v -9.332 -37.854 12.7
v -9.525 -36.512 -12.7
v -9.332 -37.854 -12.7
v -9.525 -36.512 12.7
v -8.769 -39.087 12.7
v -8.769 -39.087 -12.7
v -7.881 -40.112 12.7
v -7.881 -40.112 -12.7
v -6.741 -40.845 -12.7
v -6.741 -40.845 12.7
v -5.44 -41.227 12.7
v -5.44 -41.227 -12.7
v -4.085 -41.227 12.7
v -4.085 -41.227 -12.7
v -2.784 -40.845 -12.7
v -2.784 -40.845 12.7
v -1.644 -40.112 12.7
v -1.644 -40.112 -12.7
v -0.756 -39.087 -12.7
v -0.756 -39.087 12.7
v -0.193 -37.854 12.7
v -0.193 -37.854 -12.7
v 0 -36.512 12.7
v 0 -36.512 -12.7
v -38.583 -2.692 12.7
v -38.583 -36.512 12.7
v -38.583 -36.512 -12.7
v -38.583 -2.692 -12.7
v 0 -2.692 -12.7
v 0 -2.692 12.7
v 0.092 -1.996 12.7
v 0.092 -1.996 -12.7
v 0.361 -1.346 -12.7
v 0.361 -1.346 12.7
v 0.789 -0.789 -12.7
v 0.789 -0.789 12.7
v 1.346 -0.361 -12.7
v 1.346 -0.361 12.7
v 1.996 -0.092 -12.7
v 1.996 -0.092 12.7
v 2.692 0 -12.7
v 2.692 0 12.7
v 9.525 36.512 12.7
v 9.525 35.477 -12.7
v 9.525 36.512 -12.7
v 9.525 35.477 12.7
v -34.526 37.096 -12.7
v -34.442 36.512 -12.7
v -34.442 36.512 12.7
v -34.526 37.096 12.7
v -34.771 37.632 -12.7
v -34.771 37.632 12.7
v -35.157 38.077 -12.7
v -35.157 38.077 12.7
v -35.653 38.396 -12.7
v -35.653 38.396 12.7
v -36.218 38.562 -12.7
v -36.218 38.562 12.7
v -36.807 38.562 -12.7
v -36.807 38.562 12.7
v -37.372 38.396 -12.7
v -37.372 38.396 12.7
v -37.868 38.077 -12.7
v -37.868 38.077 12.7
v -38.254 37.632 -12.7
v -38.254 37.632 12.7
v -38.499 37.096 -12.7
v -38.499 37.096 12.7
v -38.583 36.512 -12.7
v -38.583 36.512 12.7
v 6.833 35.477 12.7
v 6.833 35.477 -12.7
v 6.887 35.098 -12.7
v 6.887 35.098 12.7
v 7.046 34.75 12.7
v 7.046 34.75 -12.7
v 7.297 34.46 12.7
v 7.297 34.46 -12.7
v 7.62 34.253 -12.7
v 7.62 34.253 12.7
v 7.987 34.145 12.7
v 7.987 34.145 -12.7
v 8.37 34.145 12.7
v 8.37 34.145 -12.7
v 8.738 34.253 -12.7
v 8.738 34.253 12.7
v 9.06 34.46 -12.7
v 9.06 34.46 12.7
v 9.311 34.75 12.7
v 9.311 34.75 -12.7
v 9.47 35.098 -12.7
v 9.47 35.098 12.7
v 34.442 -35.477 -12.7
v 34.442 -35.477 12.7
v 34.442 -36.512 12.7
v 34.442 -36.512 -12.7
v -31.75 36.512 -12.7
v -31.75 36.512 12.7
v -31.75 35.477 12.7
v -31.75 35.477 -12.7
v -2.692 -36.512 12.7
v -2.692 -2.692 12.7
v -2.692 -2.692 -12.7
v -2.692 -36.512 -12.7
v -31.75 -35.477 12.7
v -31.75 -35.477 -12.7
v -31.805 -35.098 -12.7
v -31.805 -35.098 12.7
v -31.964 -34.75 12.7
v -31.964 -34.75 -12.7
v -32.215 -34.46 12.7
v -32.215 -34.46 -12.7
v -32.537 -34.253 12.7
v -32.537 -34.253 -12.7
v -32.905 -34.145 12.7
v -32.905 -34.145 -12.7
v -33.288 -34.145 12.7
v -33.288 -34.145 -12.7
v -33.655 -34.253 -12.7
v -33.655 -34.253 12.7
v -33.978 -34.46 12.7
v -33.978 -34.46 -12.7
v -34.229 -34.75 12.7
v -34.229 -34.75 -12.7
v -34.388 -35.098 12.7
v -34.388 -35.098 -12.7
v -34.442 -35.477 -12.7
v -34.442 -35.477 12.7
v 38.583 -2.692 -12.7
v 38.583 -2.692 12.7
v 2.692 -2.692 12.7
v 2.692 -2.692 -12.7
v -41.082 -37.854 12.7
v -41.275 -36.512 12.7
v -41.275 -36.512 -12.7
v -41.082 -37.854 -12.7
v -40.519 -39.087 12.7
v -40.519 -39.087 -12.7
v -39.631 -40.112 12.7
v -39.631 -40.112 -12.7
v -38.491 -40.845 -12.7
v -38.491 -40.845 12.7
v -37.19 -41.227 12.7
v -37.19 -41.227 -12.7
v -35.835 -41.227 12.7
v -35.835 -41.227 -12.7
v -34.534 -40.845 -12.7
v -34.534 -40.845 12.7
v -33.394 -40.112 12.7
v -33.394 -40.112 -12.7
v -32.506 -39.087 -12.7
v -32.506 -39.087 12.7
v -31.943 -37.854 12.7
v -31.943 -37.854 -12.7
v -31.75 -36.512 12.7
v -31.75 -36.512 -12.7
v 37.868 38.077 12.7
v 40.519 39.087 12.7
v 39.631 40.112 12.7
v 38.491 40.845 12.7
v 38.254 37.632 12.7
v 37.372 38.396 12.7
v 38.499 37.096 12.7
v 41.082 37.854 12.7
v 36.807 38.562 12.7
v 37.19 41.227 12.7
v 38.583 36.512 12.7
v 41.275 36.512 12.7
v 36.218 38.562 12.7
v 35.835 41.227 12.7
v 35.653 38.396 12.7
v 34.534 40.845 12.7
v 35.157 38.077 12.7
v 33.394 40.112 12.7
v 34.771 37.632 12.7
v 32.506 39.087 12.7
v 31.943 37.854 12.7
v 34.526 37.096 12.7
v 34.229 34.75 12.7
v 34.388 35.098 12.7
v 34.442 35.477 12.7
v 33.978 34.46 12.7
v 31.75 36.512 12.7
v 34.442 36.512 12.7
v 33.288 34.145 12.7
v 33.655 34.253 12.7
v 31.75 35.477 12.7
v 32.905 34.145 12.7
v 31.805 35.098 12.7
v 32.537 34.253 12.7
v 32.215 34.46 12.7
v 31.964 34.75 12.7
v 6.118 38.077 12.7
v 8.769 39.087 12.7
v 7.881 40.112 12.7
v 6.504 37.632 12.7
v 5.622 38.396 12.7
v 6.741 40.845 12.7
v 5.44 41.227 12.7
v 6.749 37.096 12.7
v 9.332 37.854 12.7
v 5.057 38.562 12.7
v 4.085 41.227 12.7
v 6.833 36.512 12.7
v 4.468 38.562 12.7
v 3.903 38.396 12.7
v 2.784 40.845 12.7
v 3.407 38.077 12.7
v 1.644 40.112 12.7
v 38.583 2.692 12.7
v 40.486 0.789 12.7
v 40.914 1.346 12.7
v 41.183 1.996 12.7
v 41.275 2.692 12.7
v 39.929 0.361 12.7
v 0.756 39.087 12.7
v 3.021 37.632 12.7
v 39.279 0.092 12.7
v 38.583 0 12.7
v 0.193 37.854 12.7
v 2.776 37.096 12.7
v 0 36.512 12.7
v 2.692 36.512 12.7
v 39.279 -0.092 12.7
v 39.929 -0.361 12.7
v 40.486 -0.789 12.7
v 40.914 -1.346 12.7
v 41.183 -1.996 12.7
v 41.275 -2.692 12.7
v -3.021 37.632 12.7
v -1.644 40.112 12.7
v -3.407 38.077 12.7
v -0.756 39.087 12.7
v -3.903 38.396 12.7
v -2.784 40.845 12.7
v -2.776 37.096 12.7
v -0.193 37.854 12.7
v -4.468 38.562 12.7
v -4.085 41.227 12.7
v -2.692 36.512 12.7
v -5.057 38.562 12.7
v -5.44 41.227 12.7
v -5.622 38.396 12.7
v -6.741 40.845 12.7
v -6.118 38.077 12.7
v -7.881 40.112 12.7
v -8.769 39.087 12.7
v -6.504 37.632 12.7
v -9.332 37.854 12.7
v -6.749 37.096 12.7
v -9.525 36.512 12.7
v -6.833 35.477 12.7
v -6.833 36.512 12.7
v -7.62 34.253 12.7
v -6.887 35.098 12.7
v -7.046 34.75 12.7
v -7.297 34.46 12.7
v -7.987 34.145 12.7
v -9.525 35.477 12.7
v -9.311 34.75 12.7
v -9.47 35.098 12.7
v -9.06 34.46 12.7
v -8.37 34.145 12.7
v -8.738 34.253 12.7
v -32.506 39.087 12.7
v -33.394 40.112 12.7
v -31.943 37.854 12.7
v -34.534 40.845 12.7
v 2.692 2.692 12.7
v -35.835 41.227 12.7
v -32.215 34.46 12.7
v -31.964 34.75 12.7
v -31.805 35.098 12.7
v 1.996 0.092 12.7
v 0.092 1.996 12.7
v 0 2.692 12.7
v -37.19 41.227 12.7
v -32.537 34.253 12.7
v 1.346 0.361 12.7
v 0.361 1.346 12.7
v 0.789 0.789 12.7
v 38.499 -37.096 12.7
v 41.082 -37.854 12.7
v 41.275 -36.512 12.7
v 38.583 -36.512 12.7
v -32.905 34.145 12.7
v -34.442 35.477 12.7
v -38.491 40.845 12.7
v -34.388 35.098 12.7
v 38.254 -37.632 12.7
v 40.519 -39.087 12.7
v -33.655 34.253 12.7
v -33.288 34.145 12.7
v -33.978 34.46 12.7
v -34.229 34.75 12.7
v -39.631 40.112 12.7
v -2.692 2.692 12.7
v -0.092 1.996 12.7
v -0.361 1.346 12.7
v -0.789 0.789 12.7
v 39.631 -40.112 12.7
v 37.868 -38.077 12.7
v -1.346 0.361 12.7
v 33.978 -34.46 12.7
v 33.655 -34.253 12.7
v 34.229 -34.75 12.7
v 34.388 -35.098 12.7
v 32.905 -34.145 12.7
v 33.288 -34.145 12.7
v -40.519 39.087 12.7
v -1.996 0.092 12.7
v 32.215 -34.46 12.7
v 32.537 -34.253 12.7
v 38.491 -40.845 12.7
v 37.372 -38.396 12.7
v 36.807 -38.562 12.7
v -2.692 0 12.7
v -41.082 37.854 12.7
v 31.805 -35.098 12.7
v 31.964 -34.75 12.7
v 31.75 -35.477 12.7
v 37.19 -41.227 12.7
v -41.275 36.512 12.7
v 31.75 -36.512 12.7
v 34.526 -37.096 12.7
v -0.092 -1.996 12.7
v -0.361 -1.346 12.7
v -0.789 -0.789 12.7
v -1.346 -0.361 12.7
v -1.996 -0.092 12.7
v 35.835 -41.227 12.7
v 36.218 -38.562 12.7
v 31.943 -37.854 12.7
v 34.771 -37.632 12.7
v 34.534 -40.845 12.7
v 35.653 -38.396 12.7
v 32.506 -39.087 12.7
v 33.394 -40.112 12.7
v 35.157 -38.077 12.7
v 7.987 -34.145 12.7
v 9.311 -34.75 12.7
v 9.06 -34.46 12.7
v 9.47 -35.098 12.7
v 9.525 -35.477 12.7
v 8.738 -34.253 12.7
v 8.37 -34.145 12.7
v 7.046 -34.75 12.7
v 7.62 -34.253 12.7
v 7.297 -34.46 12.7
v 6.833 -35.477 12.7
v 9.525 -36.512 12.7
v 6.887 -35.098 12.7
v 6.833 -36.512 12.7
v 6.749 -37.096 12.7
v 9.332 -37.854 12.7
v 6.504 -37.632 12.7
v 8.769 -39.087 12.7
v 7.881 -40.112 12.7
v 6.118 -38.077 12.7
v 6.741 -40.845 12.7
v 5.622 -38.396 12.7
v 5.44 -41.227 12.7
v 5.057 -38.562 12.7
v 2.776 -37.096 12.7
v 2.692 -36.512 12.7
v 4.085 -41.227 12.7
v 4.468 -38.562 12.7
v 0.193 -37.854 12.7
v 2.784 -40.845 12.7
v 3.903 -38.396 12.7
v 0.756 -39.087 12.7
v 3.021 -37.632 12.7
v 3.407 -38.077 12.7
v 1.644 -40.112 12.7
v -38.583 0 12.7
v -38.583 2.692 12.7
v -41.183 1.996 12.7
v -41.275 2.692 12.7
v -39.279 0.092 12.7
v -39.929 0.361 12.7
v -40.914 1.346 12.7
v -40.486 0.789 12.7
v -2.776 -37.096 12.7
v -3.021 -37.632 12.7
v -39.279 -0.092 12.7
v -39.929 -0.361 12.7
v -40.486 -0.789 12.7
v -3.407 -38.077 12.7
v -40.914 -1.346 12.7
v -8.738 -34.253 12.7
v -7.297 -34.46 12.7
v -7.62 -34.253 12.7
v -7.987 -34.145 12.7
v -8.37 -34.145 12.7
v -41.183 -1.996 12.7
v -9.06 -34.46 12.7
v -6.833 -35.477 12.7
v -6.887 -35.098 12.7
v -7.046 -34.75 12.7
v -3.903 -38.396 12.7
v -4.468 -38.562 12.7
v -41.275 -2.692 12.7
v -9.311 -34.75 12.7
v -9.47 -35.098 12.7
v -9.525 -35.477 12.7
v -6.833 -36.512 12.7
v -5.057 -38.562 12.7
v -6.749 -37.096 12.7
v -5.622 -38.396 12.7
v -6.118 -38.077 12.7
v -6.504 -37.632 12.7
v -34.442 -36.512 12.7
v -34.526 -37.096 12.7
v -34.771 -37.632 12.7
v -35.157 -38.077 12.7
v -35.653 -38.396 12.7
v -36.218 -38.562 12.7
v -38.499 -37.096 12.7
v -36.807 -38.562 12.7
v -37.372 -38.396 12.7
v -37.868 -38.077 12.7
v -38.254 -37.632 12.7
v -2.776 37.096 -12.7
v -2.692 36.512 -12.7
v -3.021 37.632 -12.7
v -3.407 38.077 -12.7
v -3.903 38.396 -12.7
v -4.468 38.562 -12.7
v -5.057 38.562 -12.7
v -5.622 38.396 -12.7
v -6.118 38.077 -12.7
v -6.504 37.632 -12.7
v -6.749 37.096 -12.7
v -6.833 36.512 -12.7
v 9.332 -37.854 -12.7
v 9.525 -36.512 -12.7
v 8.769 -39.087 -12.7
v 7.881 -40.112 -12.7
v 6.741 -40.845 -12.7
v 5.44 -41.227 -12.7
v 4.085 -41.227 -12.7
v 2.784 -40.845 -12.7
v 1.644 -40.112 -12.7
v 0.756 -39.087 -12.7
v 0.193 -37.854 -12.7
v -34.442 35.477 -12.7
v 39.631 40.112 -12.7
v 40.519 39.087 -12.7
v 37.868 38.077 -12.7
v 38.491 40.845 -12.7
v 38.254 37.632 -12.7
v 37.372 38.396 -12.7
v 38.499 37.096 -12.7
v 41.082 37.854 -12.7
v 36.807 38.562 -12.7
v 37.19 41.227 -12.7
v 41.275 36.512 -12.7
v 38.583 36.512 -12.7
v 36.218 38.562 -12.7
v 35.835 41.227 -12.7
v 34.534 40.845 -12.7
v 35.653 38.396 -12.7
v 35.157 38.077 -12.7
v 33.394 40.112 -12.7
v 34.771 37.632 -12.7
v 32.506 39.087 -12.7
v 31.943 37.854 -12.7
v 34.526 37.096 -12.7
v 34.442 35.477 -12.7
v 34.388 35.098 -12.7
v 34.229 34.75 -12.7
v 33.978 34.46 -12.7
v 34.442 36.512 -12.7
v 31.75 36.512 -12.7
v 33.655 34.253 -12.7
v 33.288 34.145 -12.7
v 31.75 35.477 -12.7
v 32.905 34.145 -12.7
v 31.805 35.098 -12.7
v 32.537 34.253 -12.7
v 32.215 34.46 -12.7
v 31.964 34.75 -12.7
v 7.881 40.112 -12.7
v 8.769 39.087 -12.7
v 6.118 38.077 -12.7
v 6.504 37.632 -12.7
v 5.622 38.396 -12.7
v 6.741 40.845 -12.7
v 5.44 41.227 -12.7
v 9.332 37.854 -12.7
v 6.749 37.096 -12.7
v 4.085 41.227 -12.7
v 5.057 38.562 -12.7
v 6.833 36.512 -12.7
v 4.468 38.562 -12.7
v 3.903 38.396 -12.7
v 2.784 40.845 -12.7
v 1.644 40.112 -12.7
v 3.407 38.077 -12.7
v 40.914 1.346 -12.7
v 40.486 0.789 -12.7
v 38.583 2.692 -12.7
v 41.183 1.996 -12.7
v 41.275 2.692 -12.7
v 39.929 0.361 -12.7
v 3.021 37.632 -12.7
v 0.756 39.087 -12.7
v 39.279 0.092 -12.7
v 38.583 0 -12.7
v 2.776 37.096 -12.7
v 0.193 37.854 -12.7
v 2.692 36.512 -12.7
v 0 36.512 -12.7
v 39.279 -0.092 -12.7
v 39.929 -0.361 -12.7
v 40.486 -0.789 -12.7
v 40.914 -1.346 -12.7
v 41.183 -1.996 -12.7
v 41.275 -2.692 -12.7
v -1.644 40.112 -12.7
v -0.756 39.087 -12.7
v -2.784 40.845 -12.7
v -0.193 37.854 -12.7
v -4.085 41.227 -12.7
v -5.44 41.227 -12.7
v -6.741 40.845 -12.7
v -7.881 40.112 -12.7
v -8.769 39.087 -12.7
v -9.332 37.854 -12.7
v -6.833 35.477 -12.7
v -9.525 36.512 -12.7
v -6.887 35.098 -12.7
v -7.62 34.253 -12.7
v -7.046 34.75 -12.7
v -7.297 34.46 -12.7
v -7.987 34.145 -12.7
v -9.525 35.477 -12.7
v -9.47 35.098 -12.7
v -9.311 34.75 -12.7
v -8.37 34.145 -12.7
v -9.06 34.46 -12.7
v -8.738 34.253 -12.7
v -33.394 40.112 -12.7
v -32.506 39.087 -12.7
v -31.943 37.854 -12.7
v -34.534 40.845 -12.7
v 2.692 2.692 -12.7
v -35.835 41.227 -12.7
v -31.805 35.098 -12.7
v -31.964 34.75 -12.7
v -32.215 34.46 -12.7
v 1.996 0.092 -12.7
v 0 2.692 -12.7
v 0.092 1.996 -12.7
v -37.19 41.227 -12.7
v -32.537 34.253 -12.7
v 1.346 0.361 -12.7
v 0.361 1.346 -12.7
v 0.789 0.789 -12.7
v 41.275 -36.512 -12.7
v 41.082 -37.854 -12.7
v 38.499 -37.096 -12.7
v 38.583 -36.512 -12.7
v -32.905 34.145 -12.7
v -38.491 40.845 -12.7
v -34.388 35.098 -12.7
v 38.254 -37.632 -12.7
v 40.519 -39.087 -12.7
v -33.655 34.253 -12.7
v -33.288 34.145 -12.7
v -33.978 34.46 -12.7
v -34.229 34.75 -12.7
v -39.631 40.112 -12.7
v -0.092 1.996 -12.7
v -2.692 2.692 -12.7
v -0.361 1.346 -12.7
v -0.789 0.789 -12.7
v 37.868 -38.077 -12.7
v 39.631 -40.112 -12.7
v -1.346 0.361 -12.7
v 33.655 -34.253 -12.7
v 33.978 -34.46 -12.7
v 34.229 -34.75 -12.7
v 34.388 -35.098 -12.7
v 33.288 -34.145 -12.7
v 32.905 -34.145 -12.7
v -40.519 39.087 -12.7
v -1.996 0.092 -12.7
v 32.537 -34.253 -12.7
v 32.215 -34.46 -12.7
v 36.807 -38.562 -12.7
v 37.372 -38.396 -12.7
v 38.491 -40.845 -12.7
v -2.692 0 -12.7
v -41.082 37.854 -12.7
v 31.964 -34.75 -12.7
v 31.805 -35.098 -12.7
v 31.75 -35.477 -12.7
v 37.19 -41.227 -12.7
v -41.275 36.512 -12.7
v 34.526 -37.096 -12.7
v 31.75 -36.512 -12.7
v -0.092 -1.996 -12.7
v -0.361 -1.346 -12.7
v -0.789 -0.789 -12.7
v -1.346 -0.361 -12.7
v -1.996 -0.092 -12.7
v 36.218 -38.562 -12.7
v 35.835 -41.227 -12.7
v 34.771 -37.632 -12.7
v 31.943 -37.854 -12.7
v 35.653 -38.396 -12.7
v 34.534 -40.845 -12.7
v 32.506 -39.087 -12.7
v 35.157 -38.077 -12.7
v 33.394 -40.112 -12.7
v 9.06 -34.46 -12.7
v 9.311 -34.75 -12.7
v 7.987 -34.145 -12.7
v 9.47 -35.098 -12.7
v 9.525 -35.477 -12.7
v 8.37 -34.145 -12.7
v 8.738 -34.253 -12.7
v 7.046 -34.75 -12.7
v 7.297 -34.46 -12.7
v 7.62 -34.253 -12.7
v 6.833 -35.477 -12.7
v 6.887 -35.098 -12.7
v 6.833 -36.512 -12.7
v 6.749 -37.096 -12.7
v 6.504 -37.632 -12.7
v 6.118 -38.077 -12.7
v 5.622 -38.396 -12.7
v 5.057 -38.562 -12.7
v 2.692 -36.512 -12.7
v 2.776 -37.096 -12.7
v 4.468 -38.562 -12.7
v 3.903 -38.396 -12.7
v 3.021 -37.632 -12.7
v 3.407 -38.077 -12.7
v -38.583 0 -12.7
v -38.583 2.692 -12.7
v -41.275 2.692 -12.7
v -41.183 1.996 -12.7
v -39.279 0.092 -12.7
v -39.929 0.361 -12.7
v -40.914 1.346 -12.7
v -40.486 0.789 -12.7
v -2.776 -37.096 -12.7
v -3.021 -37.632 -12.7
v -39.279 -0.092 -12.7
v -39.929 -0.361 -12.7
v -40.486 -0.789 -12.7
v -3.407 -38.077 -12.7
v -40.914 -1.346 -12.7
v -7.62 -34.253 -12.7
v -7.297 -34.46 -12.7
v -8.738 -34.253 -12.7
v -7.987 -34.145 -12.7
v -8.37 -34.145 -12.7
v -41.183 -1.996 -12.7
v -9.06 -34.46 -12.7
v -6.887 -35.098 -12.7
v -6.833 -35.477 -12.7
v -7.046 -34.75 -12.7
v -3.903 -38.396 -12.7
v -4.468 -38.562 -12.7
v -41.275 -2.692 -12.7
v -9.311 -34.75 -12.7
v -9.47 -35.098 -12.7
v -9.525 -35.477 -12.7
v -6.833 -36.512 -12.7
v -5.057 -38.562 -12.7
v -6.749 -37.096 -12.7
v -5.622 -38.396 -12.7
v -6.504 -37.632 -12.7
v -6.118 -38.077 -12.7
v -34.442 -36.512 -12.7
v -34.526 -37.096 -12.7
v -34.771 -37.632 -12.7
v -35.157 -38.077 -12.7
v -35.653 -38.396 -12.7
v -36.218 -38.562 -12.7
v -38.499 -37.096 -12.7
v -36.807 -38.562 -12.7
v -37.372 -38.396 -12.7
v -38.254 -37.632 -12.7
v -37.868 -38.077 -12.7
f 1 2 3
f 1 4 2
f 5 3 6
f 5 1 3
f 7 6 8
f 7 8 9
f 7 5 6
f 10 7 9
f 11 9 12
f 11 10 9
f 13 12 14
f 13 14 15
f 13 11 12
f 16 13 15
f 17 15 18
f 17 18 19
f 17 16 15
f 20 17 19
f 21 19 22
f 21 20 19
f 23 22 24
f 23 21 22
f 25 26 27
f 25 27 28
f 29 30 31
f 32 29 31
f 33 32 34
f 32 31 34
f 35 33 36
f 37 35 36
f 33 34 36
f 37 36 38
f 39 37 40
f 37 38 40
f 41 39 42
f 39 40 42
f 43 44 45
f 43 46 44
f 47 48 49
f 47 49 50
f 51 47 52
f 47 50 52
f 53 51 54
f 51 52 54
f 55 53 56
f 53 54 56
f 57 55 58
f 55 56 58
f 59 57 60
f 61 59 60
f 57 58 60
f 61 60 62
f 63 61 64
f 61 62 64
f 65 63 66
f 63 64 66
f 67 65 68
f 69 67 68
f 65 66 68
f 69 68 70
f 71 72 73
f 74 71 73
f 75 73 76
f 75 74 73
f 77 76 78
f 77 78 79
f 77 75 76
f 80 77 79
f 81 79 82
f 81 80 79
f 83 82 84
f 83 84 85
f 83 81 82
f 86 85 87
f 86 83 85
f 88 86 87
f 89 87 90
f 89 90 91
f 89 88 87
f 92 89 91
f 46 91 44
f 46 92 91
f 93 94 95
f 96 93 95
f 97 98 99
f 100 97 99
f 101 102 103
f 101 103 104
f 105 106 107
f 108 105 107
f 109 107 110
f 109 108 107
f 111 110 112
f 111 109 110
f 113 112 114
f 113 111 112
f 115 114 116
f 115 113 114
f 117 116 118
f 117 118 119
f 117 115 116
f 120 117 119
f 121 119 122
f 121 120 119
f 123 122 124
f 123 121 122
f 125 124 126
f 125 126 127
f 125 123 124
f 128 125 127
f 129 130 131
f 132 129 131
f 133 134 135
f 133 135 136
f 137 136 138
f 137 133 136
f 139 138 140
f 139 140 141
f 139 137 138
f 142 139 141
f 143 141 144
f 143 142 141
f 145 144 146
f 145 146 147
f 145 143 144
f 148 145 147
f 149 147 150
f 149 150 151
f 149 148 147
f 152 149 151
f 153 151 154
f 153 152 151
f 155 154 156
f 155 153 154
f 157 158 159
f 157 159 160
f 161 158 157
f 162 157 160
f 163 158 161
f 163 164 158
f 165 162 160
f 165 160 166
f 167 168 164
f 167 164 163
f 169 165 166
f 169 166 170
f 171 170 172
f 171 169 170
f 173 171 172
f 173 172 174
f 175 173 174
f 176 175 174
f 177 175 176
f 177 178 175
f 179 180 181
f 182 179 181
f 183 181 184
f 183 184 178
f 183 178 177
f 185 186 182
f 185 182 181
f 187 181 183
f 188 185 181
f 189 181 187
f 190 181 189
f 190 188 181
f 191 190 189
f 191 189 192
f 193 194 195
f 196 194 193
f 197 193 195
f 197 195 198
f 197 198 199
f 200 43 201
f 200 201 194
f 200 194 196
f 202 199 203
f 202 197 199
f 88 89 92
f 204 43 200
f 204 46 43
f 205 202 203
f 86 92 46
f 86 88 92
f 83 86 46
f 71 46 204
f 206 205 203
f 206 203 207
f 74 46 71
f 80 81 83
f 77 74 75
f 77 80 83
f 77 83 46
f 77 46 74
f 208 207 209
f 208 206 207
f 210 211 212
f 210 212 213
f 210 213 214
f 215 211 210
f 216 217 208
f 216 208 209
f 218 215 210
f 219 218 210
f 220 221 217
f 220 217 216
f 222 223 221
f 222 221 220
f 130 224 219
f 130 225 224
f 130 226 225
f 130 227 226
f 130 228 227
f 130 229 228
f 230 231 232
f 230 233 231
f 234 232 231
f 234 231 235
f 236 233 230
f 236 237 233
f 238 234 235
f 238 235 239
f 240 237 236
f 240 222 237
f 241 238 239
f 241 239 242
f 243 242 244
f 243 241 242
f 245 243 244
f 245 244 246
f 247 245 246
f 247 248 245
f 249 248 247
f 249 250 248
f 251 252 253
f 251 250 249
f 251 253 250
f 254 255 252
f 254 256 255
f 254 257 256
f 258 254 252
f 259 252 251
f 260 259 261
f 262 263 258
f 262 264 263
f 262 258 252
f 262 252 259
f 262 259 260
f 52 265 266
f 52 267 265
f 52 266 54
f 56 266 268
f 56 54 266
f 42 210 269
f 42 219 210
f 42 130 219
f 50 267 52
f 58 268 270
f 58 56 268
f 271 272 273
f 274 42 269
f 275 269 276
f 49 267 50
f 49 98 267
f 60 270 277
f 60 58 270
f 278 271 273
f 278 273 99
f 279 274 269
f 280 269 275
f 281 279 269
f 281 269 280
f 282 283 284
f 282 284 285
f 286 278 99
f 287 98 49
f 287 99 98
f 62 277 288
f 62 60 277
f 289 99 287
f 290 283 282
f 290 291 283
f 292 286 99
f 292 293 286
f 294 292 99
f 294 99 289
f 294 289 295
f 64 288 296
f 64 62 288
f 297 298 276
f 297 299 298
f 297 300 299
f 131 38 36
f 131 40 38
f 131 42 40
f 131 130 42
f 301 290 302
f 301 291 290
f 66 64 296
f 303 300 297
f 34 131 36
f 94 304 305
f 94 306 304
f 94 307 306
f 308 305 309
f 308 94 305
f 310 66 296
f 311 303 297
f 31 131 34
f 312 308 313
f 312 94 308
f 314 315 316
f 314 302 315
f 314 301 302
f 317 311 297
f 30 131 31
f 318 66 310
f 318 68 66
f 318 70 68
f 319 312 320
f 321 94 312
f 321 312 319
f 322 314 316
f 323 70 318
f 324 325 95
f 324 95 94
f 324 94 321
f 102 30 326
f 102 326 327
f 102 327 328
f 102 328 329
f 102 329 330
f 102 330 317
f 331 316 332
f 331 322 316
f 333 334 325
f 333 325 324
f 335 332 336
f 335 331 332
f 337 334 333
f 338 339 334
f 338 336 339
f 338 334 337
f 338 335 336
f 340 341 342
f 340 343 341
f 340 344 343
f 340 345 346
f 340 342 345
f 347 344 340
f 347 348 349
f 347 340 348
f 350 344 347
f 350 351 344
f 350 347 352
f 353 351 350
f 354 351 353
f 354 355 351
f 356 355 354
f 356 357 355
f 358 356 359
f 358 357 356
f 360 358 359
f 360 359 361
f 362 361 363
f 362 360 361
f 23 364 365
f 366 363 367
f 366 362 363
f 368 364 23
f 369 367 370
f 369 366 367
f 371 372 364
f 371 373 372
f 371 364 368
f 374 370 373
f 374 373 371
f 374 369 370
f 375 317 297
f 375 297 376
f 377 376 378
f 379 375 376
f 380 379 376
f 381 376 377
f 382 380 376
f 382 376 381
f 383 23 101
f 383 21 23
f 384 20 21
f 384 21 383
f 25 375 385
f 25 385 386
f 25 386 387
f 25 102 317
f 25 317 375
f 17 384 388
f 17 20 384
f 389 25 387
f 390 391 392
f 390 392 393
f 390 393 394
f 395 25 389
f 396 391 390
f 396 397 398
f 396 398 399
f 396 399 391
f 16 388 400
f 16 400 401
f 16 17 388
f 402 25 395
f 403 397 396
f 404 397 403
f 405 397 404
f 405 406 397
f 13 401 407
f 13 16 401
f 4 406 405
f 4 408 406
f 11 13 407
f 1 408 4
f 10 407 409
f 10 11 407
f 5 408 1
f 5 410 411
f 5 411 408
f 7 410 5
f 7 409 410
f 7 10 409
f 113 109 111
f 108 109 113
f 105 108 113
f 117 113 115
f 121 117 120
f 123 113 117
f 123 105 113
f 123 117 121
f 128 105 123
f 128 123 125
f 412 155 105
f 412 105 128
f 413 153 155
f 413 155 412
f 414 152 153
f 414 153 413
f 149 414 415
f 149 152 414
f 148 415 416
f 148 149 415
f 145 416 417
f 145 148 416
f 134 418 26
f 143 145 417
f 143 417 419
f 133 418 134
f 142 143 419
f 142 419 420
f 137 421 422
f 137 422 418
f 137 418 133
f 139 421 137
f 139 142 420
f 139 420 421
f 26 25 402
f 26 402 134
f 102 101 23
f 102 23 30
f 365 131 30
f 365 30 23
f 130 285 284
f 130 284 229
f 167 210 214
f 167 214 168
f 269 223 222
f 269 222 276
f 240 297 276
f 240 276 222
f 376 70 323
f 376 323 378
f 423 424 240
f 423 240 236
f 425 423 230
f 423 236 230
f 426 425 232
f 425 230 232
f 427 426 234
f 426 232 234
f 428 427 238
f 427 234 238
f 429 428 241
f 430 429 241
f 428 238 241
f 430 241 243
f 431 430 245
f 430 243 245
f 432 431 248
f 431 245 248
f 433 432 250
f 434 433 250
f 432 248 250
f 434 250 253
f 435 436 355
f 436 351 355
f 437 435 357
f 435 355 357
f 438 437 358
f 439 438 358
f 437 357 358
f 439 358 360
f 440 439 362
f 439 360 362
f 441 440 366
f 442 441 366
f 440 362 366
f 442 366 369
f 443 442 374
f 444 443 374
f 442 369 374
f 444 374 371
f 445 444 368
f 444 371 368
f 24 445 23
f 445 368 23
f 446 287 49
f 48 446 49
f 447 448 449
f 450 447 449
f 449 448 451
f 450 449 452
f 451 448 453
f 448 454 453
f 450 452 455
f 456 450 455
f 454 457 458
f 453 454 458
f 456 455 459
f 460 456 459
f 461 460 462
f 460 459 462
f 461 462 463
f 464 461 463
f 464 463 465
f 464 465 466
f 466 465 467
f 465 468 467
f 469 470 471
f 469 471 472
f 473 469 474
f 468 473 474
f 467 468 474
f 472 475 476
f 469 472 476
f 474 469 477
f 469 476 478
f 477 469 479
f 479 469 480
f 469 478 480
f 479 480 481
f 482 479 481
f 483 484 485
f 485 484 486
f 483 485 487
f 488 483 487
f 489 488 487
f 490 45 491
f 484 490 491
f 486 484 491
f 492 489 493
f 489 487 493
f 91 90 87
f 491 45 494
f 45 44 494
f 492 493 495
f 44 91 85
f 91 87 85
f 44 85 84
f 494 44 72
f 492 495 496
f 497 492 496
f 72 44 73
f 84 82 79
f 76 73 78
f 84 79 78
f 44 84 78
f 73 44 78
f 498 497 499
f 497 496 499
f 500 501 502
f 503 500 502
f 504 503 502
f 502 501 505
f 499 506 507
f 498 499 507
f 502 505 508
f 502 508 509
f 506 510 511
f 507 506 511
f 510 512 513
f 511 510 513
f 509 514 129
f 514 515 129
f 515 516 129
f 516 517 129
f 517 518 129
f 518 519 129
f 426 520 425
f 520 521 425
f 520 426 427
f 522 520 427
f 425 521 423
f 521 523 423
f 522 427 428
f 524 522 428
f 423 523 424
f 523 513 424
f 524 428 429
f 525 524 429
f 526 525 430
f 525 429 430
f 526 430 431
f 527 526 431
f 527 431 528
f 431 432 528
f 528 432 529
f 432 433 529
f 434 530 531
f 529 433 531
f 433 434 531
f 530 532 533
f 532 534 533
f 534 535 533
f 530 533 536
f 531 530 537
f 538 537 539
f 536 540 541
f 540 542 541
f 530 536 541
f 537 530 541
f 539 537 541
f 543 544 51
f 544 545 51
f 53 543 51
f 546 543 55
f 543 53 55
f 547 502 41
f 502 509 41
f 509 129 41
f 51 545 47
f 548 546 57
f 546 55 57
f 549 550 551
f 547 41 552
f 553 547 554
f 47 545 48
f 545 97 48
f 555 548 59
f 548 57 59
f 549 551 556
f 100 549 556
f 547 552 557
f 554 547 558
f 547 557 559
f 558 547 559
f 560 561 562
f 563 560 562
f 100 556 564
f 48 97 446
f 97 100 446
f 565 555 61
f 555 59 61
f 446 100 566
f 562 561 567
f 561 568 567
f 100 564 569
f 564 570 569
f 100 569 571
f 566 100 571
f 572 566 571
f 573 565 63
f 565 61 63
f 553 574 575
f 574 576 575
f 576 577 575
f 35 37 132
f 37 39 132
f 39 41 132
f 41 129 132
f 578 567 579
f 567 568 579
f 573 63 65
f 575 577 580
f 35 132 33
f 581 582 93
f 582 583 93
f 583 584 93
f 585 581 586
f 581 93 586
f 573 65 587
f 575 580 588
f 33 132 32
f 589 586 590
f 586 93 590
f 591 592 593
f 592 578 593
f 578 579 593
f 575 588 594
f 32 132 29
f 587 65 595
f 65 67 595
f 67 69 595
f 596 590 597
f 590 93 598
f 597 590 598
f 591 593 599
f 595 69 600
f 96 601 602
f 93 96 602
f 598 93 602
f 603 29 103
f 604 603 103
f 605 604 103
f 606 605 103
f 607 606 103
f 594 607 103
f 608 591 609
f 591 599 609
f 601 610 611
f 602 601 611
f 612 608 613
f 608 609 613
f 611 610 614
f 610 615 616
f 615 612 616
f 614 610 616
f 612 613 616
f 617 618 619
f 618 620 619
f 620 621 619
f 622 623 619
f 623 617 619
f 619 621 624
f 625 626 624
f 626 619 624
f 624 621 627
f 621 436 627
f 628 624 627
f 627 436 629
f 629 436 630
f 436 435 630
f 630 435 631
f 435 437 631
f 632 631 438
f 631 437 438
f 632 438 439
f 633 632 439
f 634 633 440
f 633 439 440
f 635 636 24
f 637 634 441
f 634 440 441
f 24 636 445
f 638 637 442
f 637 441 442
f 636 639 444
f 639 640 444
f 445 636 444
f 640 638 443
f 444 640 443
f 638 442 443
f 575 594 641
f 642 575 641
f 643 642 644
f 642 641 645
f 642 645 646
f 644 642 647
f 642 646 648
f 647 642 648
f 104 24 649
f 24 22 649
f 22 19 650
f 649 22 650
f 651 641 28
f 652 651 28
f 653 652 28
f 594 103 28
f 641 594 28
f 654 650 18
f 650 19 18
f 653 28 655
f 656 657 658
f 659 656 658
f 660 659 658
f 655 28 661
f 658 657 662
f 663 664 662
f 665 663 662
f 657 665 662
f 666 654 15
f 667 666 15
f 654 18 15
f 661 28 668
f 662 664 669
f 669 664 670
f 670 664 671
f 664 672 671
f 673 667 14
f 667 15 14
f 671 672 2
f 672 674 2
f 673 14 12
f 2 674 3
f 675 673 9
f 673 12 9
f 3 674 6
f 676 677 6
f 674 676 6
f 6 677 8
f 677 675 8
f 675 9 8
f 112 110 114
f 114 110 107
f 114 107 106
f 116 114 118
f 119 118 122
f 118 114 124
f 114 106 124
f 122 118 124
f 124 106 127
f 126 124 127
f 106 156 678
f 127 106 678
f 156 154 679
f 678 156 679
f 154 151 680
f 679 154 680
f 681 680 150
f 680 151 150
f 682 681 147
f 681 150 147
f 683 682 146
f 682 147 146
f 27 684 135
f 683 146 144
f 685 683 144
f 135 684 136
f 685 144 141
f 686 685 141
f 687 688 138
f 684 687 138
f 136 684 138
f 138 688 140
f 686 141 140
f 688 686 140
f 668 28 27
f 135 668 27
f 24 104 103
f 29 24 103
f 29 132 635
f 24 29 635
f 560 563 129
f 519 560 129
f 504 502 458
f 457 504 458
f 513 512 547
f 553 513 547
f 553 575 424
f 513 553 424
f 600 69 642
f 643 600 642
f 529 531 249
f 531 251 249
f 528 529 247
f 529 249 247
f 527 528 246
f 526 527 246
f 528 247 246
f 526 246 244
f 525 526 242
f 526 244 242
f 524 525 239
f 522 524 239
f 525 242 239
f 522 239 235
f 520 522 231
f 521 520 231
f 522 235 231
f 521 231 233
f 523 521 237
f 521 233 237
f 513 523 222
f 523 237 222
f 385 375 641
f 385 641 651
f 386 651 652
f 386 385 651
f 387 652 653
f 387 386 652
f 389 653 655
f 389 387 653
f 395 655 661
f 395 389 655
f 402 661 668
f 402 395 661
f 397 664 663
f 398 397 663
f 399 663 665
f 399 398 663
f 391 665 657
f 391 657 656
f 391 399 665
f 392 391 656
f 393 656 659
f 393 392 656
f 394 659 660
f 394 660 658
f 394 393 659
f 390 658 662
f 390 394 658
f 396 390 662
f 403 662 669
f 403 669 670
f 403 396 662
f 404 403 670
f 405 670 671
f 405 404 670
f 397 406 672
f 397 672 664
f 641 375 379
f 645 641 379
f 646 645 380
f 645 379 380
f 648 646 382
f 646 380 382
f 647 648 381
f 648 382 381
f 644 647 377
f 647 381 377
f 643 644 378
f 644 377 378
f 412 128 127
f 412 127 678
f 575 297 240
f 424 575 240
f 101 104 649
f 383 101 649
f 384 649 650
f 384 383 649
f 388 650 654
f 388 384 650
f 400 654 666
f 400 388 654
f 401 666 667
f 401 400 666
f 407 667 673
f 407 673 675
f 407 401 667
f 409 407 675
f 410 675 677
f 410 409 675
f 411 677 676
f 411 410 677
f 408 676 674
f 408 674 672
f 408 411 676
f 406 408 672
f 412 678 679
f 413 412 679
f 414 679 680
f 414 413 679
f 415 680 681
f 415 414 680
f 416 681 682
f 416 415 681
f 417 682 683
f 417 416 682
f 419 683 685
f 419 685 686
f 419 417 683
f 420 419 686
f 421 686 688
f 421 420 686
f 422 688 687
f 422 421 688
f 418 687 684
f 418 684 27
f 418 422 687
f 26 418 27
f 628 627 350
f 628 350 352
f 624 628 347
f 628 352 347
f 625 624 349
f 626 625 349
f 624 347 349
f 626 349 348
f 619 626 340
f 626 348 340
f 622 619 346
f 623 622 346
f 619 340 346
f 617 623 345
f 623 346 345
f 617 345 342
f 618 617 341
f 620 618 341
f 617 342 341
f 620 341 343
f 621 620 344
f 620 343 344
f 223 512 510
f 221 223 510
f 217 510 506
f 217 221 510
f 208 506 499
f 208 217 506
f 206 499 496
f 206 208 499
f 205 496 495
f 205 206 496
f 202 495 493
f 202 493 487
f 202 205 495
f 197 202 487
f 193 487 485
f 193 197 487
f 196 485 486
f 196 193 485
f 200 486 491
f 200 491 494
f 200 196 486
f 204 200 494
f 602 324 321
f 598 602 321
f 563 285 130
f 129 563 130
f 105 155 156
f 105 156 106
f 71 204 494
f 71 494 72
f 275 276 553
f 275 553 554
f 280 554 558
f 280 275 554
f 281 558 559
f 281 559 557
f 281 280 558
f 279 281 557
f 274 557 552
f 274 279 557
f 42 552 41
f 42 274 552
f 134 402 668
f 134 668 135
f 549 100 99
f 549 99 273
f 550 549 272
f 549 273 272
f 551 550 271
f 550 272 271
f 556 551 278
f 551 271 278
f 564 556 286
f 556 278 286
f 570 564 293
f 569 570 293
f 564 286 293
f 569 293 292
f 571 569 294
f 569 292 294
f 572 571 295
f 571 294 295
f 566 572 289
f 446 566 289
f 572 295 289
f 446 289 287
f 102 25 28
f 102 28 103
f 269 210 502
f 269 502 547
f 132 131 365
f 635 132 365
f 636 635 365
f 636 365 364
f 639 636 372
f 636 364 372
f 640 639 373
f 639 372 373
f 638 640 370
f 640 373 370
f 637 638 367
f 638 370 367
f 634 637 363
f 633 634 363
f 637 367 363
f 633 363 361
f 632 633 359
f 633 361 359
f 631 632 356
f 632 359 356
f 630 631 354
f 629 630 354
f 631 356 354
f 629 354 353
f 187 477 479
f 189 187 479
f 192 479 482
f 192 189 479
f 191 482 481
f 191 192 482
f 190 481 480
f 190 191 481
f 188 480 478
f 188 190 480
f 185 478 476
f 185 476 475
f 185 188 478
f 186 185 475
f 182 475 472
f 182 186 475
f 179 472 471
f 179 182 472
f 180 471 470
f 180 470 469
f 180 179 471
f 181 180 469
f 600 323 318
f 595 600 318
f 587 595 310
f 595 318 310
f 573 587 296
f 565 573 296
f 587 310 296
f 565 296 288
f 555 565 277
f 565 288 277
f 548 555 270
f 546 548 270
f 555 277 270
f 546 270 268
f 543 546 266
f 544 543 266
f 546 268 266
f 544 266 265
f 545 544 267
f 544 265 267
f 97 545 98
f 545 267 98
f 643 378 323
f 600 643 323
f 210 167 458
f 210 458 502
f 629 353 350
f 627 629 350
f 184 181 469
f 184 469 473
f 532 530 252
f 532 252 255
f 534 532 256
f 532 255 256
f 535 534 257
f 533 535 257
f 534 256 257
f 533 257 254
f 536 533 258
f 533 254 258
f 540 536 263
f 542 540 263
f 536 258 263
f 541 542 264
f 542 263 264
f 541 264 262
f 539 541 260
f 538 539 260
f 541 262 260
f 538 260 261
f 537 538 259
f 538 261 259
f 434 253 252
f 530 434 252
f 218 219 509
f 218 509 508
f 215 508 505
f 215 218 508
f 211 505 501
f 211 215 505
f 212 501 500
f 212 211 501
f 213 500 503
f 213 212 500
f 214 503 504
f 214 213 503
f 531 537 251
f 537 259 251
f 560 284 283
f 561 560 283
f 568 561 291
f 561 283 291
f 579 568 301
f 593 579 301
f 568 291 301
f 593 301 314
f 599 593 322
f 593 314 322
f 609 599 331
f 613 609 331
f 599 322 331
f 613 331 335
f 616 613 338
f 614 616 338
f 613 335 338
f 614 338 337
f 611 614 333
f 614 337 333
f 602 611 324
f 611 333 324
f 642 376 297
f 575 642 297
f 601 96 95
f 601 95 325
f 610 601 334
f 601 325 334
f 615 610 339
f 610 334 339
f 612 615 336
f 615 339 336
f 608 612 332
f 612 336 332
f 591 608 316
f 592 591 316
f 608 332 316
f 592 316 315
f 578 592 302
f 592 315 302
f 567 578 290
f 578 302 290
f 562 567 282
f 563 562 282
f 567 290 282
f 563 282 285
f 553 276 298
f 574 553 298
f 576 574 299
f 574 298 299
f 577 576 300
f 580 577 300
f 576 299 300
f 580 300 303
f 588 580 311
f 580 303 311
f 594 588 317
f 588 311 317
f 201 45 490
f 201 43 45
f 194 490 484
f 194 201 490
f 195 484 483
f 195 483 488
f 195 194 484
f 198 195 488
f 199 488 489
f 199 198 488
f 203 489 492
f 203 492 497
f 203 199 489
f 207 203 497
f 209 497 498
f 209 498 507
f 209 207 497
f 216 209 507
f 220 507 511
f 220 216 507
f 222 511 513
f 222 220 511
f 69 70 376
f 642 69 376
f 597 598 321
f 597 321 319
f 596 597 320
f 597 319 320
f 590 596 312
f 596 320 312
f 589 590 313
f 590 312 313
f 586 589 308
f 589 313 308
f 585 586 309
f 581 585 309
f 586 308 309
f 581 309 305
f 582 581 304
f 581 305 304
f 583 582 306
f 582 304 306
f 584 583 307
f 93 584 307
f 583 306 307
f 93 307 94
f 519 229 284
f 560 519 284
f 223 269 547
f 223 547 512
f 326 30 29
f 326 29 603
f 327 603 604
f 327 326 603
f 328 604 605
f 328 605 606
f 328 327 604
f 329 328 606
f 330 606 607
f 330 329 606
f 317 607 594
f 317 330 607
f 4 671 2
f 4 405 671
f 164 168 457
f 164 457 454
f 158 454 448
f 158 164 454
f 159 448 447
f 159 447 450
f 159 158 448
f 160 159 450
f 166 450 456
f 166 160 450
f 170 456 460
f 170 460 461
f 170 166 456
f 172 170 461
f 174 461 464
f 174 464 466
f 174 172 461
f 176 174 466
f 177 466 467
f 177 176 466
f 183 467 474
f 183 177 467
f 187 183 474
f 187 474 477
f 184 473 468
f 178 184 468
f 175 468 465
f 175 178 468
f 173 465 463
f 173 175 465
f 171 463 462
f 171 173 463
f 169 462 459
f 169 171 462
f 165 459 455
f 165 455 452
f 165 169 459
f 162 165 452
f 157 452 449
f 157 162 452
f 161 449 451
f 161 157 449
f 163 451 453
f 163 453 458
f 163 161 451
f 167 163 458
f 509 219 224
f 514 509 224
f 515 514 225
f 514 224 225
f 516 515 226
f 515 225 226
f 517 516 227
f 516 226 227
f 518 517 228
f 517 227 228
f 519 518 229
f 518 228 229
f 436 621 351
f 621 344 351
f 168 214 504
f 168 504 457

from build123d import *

# Parameters (mm, degrees)
BASE_EXTRUDE_DEPTH   = 12.7
MIRROR2_COPY_1_DEPTH = 12.7


with BuildPart() as part:
    # Sketch1 → Base-Extrude (new, symmetric)
    with BuildSketch(Plane.XY):
        with BuildLine():
            Line((0, 36.5125), (0, 2.6924))
            ThreePointArc((0, 2.6924), (0.788585702, 0.788585702), (2.6924, 0))
            Line((2.6924, 0), (38.5826, 0))
            ThreePointArc((38.5826, 0), (40.486414298, 0.788585702), (41.275, 2.6924))
            Line((41.275, 2.6924), (41.275, 36.5125))
            ThreePointArc((41.275, 36.5125), (36.5125, 41.275), (31.75, 36.5125))
            Line((31.75, 36.5125), (31.75, 35.47745))
            ThreePointArc((31.75, 35.47745), (33.0962, 34.13125), (34.4424, 35.47745))
            Line((34.4424, 35.47745), (34.4424, 36.5125))
            ThreePointArc((34.4424, 36.5125), (36.5125, 38.5826), (38.5826, 36.5125))
            Line((38.5826, 36.5125), (38.5826, 2.6924))
            Line((38.5826, 2.6924), (2.6924, 2.6924))
            Line((2.6924, 2.6924), (2.6924, 36.5125))
            ThreePointArc((2.6924, 36.5125), (4.7625, 38.5826), (6.8326, 36.5125))
            Line((6.8326, 36.5125), (6.8326, 35.47745))
            ThreePointArc((6.8326, 35.47745), (8.1788, 34.13125), (9.525, 35.47745))
            Line((9.525, 35.47745), (9.525, 36.5125))
            ThreePointArc((9.525, 36.5125), (4.7625, 41.275), (0, 36.5125))
        make_face()
    base_extrude = extrude(amount=BASE_EXTRUDE_DEPTH, both=True)

    # Mirror1: Base-Extrude across plane
    add(base_extrude.mirror(Plane(origin=(0, 0, 0), x_dir=(0, 0, 1), z_dir=(1, 0, 0))))

    # Mirror2: Base-Extrude across plane
    add(base_extrude.mirror(Plane.ZX))

    # Mirror2 copy 1 sketch → Mirror2 copy 1 (add, symmetric)
    with BuildSketch(Plane(origin=(0, 0, 0), x_dir=(-1, 0, 0), z_dir=(0, 0, 1))):
        with BuildLine():
            Line((0, 36.5125), (0, 2.6924))
            ThreePointArc((0, 2.6924), (0.788585702, 0.788585702), (2.6924, 0))
            Line((2.6924, 0), (38.5826, 0))
            ThreePointArc((38.5826, 0), (40.486414298, 0.788585702), (41.275, 2.6924))
            Line((41.275, 2.6924), (41.275, 36.5125))
            ThreePointArc((41.275, 36.5125), (36.5125, 41.275), (31.75, 36.5125))
            Line((31.75, 36.5125), (31.75, 35.47745))
            ThreePointArc((31.75, 35.47745), (33.0962, 34.13125), (34.4424, 35.47745))
            Line((34.4424, 35.47745), (34.4424, 36.5125))
            ThreePointArc((34.4424, 36.5125), (36.5125, 38.5826), (38.5826, 36.5125))
            Line((38.5826, 36.5125), (38.5826, 2.6924))
            Line((38.5826, 2.6924), (2.6924, 2.6924))
            Line((2.6924, 2.6924), (2.6924, 36.5125))
            ThreePointArc((2.6924, 36.5125), (4.7625, 38.5826), (6.8326, 36.5125))
            Line((6.8326, 36.5125), (6.8326, 35.47745))
            ThreePointArc((6.8326, 35.47745), (8.1788, 34.13125), (9.525, 35.47745))
            Line((9.525, 35.47745), (9.525, 36.5125))
            ThreePointArc((9.525, 36.5125), (4.7625, 41.275), (0, 36.5125))
        make_face()
    extrude(amount=MIRROR2_COPY_1_DEPTH, both=True)


solid = part.part
